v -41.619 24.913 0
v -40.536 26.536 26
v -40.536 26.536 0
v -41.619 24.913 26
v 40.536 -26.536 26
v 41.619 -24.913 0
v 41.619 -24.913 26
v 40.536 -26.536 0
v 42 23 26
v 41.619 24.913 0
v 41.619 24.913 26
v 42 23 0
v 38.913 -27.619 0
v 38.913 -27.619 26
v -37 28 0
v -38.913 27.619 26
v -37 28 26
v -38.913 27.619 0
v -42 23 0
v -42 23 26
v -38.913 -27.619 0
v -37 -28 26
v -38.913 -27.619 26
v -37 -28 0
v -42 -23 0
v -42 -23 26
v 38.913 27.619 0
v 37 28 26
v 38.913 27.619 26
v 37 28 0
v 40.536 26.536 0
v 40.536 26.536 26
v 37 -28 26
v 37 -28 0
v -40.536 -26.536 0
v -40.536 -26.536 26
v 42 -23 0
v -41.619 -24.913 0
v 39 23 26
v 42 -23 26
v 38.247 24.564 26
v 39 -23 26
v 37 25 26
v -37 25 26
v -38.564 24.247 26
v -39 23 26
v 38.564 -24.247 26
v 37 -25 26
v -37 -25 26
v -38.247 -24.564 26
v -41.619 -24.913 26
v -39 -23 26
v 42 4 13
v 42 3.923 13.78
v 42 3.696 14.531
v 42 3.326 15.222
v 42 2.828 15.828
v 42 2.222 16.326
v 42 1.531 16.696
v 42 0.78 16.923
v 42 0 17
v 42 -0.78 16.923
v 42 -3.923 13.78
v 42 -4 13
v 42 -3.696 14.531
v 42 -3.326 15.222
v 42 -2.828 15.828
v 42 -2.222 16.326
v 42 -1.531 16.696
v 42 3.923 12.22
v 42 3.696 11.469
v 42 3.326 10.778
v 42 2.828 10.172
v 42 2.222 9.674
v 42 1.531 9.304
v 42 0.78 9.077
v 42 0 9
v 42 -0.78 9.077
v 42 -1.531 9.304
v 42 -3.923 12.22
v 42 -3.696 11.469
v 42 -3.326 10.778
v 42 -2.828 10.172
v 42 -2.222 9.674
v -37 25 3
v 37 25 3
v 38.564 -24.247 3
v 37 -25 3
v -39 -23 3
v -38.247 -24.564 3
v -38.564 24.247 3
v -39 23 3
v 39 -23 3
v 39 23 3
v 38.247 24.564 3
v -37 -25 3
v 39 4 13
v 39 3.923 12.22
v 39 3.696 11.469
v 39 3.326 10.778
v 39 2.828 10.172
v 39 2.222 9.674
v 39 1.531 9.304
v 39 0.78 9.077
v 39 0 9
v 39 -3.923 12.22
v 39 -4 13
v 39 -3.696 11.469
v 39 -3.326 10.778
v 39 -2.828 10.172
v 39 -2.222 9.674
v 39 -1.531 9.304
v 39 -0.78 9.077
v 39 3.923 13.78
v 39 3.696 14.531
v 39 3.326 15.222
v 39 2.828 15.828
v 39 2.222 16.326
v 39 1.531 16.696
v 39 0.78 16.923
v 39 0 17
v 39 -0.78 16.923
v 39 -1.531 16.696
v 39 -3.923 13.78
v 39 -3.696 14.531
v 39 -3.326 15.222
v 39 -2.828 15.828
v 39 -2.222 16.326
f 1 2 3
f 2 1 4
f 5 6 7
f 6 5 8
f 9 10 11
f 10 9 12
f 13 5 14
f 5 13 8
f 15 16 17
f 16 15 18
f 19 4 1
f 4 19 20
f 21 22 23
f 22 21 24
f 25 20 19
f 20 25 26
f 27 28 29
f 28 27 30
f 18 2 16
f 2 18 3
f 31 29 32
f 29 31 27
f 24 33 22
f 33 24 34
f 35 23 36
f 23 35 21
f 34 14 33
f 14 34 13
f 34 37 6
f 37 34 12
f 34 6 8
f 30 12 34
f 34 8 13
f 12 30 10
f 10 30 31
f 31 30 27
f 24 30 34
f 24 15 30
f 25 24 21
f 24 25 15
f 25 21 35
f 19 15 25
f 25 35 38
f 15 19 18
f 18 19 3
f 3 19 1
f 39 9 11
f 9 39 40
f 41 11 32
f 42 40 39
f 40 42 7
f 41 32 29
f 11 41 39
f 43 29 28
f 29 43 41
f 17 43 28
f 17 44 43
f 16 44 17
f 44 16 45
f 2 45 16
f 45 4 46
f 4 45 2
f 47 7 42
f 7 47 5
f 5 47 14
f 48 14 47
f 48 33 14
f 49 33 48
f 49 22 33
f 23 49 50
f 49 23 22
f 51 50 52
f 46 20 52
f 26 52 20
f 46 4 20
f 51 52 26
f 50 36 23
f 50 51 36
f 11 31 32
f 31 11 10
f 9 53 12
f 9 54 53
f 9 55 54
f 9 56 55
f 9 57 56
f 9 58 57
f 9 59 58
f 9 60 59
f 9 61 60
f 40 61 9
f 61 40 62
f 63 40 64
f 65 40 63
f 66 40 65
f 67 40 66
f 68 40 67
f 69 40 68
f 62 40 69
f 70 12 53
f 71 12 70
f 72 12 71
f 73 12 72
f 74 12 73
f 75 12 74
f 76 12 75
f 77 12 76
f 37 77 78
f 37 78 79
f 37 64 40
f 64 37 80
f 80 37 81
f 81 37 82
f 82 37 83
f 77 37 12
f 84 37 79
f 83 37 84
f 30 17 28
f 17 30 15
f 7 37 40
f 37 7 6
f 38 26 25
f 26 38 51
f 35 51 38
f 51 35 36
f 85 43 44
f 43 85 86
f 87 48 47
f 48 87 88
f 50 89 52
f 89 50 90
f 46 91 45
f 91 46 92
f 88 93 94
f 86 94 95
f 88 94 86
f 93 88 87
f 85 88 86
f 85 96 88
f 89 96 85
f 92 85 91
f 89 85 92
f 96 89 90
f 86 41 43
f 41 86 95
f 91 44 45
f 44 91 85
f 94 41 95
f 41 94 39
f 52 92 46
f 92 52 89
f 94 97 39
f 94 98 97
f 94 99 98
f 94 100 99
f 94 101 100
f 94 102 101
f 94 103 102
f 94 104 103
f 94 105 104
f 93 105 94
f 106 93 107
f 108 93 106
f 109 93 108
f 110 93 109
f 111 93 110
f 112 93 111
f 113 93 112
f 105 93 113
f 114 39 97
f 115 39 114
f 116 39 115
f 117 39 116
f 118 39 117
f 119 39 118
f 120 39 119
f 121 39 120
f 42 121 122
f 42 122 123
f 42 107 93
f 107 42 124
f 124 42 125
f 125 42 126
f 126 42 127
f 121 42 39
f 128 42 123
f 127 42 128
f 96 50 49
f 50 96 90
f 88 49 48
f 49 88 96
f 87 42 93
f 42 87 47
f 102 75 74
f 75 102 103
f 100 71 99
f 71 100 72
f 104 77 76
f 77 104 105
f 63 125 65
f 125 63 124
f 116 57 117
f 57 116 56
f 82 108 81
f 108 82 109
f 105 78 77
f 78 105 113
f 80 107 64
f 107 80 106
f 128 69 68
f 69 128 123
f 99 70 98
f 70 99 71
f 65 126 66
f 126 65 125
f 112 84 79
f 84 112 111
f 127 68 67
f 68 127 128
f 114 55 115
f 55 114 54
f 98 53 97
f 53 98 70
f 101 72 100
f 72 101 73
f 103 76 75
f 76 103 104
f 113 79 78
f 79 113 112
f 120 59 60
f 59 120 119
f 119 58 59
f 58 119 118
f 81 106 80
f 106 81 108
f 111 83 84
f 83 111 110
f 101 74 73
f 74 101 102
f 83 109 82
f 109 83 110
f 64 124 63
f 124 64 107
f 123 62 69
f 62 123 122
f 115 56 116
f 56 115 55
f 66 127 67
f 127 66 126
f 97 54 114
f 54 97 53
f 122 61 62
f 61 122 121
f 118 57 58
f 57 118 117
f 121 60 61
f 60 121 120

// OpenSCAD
// Deterministic production smoke for dcc-mcp-openscad.
width = 84;
depth = 56;
height = 26;
wall = 3;
corner_radius = 5;
vent_count = 5;

module rounded_plate(size_x, size_y, size_z, radius) {
    linear_extrude(height=size_z)
        offset(r=radius)
            square([size_x - 2 * radius, size_y - 2 * radius], center=true);
}

module enclosure_shell() {
    difference() {
        rounded_plate(width, depth, height, corner_radius);
        translate([0, 0, wall])
            rounded_plate(
                width - 2 * wall,
                depth - 2 * wall,
                height,
                max(1, corner_radius - wall)
            );
        for (index = [0 : vent_count - 1]) {
            translate([(index - (vent_count - 1) / 2) * 10, 0, height - wall])
                cube([5, depth - 16, wall * 3], center=true);
        }
        translate([width / 2 - wall, 0, height / 2])
            rotate([0, 90, 0])
                cylinder(h=wall * 3, r=4, center=true, $fn=32);
    }
}

enclosure_shell();
